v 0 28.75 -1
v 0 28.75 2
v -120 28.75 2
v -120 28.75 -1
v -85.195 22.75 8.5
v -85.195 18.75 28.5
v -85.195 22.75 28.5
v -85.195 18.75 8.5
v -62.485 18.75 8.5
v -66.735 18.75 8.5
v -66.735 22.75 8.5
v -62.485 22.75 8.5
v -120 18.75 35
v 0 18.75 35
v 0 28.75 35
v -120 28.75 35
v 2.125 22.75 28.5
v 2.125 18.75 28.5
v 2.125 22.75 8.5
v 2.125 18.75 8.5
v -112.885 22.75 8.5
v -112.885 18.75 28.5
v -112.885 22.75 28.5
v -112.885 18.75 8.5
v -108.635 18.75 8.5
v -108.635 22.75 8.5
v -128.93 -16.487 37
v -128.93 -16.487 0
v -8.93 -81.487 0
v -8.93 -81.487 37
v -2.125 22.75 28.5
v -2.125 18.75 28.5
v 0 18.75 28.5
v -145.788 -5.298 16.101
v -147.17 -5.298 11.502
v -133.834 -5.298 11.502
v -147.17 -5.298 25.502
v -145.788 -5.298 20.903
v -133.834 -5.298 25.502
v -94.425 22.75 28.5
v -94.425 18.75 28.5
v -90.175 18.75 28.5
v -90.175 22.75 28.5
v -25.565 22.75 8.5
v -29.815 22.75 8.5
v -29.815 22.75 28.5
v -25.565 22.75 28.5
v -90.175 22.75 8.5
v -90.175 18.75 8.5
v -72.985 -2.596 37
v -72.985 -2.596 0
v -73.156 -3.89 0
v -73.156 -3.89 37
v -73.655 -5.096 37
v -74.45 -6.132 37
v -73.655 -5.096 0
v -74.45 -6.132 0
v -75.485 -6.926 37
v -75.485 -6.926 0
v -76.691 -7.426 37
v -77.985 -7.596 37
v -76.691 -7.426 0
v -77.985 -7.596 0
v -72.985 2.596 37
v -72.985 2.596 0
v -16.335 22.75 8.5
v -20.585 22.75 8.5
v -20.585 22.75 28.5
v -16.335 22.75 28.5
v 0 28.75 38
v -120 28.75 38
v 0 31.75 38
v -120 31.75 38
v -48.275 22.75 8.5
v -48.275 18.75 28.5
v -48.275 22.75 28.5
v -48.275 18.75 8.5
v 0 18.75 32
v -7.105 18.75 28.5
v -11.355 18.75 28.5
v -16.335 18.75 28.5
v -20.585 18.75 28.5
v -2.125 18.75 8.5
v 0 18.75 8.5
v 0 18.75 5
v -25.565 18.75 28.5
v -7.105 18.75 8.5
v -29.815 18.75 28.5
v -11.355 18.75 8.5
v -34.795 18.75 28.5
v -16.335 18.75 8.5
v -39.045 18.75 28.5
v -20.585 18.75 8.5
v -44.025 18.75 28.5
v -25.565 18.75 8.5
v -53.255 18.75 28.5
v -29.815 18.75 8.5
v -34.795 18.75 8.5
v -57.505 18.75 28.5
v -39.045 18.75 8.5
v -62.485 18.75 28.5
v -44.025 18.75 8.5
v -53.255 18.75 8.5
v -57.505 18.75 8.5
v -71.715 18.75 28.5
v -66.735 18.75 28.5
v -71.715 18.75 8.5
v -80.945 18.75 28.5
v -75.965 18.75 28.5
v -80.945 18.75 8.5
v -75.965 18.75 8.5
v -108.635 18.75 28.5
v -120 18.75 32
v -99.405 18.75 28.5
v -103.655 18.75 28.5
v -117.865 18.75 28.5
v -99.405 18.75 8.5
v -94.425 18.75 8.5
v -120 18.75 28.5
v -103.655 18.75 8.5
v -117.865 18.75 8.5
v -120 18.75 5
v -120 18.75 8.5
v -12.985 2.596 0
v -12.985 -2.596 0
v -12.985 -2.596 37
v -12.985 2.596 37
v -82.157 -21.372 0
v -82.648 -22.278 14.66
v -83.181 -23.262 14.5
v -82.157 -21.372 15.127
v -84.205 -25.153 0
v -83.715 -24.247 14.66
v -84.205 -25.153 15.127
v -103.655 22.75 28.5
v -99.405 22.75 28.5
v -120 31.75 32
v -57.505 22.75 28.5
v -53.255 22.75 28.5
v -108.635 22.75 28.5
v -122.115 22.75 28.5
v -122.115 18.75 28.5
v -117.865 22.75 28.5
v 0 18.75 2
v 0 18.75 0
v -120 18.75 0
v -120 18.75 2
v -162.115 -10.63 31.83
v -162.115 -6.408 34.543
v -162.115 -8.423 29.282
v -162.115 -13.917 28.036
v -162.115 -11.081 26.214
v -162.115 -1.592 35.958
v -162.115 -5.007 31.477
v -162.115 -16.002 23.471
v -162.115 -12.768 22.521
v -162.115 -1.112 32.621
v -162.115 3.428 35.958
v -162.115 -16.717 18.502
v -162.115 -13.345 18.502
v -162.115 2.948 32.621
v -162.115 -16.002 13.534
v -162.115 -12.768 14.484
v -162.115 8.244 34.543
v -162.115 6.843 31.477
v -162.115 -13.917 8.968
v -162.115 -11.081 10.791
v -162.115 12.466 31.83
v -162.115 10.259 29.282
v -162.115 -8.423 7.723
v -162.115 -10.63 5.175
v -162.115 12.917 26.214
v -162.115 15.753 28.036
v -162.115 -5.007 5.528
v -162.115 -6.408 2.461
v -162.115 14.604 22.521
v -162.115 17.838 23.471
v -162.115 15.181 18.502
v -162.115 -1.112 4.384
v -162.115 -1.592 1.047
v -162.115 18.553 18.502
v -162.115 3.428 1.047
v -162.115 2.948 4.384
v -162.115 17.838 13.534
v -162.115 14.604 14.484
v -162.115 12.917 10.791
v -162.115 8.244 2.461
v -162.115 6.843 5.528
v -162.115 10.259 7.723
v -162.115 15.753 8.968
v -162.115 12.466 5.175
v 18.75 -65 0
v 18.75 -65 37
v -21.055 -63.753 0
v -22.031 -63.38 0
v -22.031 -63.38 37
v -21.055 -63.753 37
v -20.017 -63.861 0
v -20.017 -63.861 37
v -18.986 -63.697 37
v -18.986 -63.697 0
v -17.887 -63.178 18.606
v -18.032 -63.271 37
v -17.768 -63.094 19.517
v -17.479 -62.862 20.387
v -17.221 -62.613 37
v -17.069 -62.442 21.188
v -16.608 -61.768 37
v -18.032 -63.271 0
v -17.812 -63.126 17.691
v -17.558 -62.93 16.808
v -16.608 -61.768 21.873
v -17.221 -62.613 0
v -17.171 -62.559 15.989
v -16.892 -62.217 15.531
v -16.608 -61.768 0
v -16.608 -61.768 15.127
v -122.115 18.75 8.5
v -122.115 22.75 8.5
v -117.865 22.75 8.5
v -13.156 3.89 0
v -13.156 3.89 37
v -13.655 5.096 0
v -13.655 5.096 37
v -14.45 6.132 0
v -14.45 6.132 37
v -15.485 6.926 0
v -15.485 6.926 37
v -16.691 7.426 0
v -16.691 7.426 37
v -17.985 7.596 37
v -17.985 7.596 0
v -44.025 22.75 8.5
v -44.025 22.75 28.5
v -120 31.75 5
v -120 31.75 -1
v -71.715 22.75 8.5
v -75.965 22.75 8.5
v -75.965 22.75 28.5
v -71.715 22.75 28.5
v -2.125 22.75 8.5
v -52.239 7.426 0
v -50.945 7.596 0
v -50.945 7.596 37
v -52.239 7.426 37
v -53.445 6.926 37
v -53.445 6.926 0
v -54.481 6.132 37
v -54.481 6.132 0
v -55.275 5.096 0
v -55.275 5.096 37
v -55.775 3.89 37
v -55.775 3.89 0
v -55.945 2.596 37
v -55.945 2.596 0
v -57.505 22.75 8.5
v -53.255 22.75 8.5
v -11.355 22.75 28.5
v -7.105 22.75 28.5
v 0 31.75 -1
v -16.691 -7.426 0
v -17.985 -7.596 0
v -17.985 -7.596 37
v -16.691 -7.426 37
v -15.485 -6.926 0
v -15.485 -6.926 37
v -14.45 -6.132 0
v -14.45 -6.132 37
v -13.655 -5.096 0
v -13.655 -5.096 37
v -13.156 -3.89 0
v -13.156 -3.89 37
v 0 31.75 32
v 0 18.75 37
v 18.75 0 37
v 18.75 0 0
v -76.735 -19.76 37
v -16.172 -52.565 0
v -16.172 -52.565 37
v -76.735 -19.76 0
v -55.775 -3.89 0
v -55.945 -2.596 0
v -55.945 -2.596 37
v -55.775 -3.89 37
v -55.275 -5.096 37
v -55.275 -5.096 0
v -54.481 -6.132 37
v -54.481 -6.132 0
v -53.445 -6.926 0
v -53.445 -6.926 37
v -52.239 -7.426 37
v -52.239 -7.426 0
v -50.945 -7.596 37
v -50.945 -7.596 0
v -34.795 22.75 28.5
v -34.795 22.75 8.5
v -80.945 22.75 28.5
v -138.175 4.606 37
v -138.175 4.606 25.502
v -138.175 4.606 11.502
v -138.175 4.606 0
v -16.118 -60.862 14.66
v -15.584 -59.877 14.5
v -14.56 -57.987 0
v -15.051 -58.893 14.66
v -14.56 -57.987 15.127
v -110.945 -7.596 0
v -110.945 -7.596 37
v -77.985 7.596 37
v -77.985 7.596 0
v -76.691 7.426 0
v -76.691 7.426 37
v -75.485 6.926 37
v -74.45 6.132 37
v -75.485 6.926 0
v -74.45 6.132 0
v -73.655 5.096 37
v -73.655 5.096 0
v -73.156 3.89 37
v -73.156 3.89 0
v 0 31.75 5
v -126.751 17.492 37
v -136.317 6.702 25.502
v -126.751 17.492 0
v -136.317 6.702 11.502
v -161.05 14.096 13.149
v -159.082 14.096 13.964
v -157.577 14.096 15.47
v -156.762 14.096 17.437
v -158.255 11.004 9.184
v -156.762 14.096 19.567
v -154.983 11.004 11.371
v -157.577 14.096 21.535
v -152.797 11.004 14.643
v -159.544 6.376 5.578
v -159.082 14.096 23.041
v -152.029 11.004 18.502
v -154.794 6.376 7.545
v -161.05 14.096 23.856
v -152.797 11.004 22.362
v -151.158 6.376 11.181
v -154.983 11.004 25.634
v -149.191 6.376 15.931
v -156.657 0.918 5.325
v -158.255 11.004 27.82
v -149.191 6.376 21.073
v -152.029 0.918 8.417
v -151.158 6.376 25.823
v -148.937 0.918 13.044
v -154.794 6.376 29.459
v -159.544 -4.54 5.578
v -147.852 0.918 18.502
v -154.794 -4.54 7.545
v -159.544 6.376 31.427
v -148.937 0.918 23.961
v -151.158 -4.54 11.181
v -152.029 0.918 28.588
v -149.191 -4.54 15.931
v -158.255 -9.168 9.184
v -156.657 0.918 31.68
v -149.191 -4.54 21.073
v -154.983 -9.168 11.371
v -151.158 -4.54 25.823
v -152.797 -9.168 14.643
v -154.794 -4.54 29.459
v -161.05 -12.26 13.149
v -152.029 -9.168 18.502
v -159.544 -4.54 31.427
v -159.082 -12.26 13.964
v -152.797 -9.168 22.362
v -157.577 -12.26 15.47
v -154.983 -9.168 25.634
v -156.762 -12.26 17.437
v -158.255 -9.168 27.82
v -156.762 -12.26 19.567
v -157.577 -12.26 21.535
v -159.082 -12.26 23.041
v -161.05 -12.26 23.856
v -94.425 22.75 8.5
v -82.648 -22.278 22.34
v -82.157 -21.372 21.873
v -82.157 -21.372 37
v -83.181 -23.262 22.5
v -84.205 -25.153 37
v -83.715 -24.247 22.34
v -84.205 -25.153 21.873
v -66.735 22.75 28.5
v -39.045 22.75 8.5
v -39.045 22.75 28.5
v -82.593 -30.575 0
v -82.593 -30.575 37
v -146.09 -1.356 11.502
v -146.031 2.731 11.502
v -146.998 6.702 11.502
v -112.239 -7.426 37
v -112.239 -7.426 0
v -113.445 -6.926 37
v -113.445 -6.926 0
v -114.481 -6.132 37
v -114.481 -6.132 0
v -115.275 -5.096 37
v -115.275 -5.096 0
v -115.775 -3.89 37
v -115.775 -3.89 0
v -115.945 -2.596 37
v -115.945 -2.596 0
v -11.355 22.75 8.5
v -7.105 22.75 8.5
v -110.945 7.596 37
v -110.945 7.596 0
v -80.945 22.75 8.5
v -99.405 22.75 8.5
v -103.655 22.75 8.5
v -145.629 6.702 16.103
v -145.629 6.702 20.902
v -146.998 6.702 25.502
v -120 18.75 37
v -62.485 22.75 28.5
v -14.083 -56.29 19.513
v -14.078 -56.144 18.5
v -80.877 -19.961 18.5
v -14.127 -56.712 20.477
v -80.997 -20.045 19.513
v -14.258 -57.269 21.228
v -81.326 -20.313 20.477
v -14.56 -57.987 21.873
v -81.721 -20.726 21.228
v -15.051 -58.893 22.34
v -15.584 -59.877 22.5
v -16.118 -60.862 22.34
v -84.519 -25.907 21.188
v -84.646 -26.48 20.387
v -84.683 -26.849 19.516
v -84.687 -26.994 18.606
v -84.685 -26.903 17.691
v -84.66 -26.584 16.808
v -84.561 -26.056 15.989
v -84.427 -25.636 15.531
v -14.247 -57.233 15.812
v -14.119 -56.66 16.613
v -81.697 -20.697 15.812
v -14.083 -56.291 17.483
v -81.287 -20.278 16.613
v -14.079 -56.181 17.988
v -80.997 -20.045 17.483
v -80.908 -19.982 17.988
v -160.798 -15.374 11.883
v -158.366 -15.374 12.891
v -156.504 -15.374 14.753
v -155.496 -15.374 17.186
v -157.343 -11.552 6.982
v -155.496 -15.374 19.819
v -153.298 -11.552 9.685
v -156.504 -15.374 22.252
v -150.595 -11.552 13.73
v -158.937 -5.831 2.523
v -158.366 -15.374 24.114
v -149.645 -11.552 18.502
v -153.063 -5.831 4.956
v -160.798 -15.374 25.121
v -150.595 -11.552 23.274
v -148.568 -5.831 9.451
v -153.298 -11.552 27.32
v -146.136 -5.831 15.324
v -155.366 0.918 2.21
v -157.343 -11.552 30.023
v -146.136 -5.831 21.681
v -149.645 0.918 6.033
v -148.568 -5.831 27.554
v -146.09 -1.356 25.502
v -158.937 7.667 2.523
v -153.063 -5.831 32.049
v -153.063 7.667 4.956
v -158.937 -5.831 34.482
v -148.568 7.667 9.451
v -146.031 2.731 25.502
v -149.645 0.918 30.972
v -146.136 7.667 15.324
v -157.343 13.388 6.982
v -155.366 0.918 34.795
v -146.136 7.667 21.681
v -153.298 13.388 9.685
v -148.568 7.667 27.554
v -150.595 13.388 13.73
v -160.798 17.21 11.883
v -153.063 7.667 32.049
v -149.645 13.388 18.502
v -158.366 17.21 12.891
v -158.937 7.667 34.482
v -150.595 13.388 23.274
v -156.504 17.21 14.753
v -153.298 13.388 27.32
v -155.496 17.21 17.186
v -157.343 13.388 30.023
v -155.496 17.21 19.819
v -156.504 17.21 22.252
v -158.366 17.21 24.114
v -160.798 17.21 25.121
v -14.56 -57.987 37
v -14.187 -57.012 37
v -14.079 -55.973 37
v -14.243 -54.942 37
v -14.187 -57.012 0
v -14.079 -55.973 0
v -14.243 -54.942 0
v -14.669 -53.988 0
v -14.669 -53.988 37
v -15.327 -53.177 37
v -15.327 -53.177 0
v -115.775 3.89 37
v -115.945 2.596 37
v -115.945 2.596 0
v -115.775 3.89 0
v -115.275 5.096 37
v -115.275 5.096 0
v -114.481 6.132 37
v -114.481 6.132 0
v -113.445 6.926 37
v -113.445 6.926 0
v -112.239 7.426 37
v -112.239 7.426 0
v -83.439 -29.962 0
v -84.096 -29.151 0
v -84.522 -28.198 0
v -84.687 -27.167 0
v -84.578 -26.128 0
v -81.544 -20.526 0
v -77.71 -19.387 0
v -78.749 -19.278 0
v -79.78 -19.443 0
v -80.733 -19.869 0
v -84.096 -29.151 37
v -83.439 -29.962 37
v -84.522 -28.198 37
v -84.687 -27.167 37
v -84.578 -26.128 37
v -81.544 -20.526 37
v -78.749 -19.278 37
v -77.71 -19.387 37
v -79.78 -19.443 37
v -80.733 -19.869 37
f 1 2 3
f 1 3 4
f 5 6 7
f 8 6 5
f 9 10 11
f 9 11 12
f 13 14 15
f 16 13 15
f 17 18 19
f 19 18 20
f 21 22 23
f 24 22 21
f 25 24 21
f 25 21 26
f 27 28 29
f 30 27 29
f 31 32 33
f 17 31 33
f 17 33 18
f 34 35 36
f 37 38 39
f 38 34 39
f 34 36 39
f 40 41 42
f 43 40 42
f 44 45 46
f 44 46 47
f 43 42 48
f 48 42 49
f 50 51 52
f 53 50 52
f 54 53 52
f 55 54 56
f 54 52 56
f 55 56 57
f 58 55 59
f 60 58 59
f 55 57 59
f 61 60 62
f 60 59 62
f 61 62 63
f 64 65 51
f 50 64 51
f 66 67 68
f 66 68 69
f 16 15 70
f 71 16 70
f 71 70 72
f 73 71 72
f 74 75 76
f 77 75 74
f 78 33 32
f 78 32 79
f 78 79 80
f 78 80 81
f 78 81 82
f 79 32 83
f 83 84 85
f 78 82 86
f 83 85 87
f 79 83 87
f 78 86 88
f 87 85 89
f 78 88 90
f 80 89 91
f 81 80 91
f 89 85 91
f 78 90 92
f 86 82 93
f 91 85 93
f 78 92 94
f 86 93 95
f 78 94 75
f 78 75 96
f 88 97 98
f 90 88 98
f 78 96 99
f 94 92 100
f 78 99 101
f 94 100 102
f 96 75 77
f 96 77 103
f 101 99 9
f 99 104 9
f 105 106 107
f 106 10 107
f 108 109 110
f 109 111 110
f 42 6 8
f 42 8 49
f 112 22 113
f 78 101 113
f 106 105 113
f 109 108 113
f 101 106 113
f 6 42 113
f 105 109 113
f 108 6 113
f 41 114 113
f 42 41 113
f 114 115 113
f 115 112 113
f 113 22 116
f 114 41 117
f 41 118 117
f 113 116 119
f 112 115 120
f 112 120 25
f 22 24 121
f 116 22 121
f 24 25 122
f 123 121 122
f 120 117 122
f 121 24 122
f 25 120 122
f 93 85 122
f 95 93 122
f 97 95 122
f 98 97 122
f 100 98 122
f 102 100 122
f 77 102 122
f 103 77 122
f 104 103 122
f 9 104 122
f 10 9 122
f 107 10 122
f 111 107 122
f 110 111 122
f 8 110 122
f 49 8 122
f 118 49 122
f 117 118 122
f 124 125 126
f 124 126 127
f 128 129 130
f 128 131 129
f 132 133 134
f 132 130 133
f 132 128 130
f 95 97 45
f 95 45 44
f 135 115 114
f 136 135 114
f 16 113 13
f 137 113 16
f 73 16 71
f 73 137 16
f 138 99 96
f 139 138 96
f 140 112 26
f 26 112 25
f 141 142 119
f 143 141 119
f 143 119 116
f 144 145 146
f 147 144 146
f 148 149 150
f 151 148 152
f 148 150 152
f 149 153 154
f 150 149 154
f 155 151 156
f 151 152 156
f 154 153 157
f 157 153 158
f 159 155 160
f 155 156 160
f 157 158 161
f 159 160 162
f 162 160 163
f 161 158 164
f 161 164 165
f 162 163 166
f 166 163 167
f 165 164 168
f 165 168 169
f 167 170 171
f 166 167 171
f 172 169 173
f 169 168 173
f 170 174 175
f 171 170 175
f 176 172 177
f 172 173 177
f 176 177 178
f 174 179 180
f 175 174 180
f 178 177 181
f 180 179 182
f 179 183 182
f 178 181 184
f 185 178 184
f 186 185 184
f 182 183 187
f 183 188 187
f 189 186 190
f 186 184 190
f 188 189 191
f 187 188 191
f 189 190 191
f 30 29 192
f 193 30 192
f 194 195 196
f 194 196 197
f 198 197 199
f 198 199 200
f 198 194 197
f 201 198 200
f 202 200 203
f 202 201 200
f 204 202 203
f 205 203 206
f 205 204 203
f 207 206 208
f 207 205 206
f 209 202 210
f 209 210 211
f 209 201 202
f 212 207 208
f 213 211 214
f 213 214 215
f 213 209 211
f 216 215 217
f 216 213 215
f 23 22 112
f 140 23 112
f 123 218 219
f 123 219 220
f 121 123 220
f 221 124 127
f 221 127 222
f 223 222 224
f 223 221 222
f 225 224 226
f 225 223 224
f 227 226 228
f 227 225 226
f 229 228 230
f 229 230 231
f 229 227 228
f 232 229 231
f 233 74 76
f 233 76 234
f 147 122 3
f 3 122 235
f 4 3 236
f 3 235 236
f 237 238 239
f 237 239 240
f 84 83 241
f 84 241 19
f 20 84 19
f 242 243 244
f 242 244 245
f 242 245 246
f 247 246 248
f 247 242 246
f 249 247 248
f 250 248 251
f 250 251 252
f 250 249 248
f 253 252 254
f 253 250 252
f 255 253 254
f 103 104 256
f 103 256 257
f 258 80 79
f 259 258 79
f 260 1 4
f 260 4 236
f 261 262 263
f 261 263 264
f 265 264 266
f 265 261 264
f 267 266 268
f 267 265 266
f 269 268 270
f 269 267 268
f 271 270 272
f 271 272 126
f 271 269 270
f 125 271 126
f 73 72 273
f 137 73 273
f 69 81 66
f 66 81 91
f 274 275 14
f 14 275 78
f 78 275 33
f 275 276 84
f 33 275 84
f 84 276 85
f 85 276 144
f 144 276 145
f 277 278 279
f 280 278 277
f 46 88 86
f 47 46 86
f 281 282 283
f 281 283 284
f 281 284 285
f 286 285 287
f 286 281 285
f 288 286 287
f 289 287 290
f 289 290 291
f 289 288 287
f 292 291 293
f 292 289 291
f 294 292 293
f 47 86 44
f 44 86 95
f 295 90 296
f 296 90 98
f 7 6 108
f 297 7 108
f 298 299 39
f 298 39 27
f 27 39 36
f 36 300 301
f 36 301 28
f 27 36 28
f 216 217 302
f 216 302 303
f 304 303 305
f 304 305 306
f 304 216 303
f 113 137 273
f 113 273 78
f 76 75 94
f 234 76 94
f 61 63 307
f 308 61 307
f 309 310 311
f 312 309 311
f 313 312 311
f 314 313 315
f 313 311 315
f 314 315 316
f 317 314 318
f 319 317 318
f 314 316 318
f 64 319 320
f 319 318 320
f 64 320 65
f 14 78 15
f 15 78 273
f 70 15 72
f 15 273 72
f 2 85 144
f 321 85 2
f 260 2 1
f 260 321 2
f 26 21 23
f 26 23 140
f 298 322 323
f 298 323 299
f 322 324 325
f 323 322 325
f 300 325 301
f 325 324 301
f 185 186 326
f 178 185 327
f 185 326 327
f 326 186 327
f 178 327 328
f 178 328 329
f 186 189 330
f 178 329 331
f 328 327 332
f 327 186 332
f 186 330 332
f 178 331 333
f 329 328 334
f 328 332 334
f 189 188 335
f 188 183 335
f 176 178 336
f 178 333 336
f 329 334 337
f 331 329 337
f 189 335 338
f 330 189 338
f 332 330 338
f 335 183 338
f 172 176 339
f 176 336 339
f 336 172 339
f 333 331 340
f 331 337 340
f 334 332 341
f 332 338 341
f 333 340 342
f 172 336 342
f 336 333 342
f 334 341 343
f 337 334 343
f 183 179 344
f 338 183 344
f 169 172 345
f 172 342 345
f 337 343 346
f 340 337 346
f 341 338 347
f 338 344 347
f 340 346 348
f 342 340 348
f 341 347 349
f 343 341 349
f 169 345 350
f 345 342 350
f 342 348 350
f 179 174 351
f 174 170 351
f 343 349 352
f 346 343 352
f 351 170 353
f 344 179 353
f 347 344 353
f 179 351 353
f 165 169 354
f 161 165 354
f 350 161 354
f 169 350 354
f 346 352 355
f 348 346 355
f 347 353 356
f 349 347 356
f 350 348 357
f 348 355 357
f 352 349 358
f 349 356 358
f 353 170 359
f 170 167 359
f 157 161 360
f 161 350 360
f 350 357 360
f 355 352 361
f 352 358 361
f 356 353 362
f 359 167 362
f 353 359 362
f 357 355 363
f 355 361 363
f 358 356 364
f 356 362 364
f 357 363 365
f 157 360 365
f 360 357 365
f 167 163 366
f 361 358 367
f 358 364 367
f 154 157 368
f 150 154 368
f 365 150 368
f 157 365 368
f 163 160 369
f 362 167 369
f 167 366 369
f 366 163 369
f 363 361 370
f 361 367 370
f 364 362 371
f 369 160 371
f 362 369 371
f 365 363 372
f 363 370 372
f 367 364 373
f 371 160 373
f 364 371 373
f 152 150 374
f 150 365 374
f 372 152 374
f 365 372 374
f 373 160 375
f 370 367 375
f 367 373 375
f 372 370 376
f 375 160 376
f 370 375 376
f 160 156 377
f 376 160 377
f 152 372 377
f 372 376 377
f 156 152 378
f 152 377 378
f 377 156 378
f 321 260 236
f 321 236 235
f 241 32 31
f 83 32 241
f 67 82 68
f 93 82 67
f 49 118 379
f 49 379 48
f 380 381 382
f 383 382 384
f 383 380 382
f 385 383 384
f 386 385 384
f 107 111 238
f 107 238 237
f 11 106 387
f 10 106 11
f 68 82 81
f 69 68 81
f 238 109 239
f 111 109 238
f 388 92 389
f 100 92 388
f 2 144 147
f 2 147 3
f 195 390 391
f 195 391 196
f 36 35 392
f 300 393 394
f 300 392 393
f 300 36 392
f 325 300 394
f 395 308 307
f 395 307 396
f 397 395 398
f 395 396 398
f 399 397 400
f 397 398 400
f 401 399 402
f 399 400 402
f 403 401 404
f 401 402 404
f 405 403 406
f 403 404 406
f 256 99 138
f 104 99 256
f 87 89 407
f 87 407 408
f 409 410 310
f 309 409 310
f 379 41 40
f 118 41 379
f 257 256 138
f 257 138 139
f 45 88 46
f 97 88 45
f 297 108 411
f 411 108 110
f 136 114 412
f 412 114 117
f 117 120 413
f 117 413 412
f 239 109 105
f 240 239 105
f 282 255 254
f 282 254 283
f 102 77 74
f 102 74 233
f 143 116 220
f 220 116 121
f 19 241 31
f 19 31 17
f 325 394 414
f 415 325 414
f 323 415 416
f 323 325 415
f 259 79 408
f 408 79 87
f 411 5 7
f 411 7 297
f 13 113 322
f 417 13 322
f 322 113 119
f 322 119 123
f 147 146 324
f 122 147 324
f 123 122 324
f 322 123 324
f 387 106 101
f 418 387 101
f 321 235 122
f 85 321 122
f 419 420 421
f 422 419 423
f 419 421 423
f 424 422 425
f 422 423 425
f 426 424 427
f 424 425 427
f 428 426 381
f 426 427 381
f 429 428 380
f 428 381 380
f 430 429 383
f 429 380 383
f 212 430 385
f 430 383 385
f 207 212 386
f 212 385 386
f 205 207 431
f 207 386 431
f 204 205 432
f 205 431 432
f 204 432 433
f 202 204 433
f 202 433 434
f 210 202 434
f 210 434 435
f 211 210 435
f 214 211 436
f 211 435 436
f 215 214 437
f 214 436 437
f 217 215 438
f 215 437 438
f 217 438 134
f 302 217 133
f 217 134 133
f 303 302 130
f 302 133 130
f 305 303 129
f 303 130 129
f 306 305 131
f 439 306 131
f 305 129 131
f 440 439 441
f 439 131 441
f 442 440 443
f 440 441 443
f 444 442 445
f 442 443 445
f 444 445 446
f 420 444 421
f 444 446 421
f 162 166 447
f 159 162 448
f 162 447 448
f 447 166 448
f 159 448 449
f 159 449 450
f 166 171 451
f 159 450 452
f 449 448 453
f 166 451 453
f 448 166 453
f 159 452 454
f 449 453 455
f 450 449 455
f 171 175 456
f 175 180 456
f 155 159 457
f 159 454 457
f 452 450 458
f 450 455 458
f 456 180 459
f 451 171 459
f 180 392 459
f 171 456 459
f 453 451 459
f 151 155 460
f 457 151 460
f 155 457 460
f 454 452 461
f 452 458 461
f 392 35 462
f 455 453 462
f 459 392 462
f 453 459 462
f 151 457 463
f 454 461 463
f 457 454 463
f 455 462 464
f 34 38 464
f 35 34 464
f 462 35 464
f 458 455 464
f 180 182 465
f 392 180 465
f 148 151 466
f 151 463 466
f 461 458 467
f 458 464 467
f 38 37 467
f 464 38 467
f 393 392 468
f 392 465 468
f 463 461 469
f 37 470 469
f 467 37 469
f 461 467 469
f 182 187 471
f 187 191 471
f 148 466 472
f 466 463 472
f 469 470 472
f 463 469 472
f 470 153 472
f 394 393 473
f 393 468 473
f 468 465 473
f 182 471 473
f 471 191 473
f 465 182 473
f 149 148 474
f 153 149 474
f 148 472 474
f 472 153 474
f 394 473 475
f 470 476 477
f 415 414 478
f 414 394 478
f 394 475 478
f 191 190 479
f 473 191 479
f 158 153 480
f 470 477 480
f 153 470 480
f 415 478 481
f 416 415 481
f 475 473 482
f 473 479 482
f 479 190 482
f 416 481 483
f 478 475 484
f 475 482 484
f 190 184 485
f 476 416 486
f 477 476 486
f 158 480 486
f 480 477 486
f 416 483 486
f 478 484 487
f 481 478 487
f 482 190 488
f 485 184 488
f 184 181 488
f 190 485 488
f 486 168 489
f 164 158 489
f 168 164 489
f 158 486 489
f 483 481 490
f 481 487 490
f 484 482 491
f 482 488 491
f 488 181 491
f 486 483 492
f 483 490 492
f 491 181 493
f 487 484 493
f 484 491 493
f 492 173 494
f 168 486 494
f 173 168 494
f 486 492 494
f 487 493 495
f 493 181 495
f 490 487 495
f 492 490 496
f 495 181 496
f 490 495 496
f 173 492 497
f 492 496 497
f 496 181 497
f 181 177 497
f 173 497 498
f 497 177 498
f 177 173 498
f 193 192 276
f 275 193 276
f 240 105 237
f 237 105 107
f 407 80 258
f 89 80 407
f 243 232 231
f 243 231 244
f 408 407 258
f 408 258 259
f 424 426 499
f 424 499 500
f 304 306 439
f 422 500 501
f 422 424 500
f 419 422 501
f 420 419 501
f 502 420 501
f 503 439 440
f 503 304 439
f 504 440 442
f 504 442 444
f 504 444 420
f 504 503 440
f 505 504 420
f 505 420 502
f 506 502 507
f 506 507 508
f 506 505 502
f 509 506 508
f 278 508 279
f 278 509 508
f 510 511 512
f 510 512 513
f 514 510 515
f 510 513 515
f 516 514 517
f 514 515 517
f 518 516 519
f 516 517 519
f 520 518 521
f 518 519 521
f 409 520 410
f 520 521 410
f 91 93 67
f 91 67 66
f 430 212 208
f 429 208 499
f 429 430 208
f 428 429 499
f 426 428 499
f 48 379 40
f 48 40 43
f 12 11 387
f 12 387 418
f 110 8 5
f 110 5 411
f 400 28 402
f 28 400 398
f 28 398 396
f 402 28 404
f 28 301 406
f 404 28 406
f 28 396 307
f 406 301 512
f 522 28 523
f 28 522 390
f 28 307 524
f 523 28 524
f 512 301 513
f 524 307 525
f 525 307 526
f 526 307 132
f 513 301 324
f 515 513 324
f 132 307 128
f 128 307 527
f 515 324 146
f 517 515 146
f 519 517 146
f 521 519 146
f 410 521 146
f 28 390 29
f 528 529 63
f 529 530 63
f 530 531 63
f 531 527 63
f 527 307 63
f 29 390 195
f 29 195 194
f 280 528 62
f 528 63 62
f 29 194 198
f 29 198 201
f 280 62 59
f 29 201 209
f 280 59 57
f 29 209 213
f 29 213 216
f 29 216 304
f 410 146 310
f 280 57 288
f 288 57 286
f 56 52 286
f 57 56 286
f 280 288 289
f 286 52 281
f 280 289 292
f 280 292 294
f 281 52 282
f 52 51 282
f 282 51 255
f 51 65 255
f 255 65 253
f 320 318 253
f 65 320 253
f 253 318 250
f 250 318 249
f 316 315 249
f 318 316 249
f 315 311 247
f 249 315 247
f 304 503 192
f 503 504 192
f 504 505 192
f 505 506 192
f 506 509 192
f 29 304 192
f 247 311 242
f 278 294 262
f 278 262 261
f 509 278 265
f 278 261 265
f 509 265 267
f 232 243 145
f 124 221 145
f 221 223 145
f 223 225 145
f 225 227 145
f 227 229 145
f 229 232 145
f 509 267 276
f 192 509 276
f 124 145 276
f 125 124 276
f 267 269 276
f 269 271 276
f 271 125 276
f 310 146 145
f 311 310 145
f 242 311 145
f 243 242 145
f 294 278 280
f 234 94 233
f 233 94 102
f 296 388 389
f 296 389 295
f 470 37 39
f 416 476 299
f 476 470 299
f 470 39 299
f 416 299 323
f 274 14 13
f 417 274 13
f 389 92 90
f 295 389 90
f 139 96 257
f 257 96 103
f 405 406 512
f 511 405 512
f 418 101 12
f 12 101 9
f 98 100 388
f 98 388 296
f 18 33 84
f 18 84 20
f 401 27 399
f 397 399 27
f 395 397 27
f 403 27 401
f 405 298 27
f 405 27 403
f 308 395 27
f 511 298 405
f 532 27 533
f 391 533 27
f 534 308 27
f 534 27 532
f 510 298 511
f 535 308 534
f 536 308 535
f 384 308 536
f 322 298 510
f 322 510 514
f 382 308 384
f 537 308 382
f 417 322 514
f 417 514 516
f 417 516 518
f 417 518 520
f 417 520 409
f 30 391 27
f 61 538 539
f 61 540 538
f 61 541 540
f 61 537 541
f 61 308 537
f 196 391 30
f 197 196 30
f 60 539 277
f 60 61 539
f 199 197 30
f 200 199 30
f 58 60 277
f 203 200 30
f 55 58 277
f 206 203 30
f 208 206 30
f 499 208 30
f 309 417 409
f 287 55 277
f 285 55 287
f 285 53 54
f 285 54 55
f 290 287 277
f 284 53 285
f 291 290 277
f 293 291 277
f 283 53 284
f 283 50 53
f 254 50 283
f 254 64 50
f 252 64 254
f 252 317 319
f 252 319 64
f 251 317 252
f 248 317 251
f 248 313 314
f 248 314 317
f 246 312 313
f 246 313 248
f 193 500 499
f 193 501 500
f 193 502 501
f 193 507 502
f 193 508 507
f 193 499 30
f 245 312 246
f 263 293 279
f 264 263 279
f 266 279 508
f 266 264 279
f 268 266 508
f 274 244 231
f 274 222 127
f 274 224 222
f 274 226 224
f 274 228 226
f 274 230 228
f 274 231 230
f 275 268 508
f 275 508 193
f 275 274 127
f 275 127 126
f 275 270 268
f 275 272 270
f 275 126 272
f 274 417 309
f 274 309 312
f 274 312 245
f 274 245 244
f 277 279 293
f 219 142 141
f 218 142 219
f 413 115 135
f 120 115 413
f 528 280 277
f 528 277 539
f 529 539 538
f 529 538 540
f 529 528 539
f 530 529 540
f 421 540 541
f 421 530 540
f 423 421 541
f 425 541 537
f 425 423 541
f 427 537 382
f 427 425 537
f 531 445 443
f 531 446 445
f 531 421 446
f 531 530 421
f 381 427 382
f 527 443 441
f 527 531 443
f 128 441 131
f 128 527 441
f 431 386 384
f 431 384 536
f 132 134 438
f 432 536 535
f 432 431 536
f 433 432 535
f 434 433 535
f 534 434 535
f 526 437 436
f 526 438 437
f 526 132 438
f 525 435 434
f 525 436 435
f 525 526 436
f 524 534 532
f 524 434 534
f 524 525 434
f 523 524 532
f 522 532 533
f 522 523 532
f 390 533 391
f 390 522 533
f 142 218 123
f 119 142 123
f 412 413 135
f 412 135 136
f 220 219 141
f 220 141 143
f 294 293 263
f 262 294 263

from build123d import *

# Parameters (mm, degrees)
BOSS_EXTRUDE1_DEPTH     = 37
CUT_EXTRUDE1_DEPTH      = 37
CUT_EXTRUDE1_DEPTH_BACK = 1
SKETCH13_W              = 4.25
SKETCH13_H              = 20
BOSS_EXTRUDE3_DEPTH     = 4
REVOLVE4_ANGLE          = 180
BOSS_EXTRUDE5_START     = 1.719088
SKETCH24_W              = 14
SKETCH24_H              = 12
BOSS_EXTRUDE5_DEPTH     = 13.336158
BOSS_EXTRUDE6_DEPTH     = 120
CUT_EXTRUDE2_DEPTH      = 37


with BuildPart() as part:
    # Sketch8 → Boss-Extrude1 (new body)
    with BuildSketch(Plane.XY):
        Polygon((0, 18.749877704), (-119.999774223, 18.749877704), (-126.751399414, 17.492106186), (-138.175152238, 4.606192282), (-128.930068484, -16.486854671), (-8.930236022, -81.486624843), (18.749877704, -64.999999997), (18.749877704, 0), align=None)
    extrude(amount=BOSS_EXTRUDE1_DEPTH)

    # Sketch10 → Cut-Extrude1 (cut, two sides)
    with BuildSketch(Plane.XY) as cut_extrude1_sk:
        with BuildLine():
            Line((-50.945075891, -7.596026142), (-17.985230256, -7.596026142))
            ThreePointArc((-17.985230256, -7.596026142), (-14.44969635, -6.131560048), (-12.985230256, -2.596026142))
            Line((-12.985230256, -2.596026142), (-12.985230256, 2.596026142))
            ThreePointArc((-12.985230256, 2.596026142), (-14.44969635, 6.131560048), (-17.985230256, 7.596026142))
            Line((-17.985230256, 7.596026142), (-50.945075891, 7.596026142))
            ThreePointArc((-50.945075891, 7.596026142), (-54.480609797, 6.131560048), (-55.945075891, 2.596026142))
            Line((-55.945075891, 2.596026142), (-55.945075891, -2.596026142))
            ThreePointArc((-55.945075891, -2.596026142), (-54.480609797, -6.131560048), (-50.945075891, -7.596026142))
        make_face()
        with BuildLine():
            Line((-110.945075891, 7.596026142), (-77.985230256, 7.596026142))
            ThreePointArc((-77.985230256, 7.596026142), (-74.44969635, 6.131560048), (-72.985230256, 2.596026142))
            Line((-72.985230256, 2.596026142), (-72.985230256, -2.596026142))
            ThreePointArc((-72.985230256, -2.596026142), (-74.44969635, -6.131560048), (-77.985230256, -7.596026142))
            Line((-77.985230256, -7.596026142), (-110.945075891, -7.596026142))
            ThreePointArc((-110.945075891, -7.596026142), (-114.480609797, -6.131560048), (-115.945075891, -2.596026142))
            Line((-115.945075891, -2.596026142), (-115.945075891, 2.596026142))
            ThreePointArc((-115.945075891, 2.596026142), (-114.480609797, 6.131560048), (-110.945075891, 7.596026142))
        make_face()
    extrude(amount=CUT_EXTRUDE1_DEPTH, mode=Mode.SUBTRACT)
    extrude(cut_extrude1_sk.sketch, amount=-CUT_EXTRUDE1_DEPTH_BACK, mode=Mode.SUBTRACT)

    # Sketch13 → Boss-Extrude3 (add)
    with BuildSketch(Plane(origin=(0, 18.749877704, 0), x_dir=(1, 0, 0), z_dir=(0, 1, 0))):
        with Locations((0, -18.5)):
            Rectangle(SKETCH13_W, SKETCH13_H)
        with Locations((-9.23, -18.5)):
            Rectangle(SKETCH13_W, SKETCH13_H)
        with Locations((-18.46, -18.5)):
            Rectangle(SKETCH13_W, SKETCH13_H)
        with Locations((-27.69, -18.5)):
            Rectangle(SKETCH13_W, SKETCH13_H)
        with Locations((-36.92, -18.5)):
            Rectangle(SKETCH13_W, SKETCH13_H)
        with Locations((-46.15, -18.5)):
            Rectangle(SKETCH13_W, SKETCH13_H)
        with Locations((-55.38, -18.5)):
            Rectangle(SKETCH13_W, SKETCH13_H)
        with Locations((-64.61, -18.5)):
            Rectangle(SKETCH13_W, SKETCH13_H)
        with Locations((-73.84, -18.5)):
            Rectangle(SKETCH13_W, SKETCH13_H)
        with Locations((-83.07, -18.5)):
            Rectangle(SKETCH13_W, SKETCH13_H)
        with Locations((-92.3, -18.5)):
            Rectangle(SKETCH13_W, SKETCH13_H)
        with Locations((-101.53, -18.5)):
            Rectangle(SKETCH13_W, SKETCH13_H)
        with Locations((-110.76, -18.5)):
            Rectangle(SKETCH13_W, SKETCH13_H)
        with Locations((-119.99, -18.5)):
            Rectangle(SKETCH13_W, SKETCH13_H)
    extrude(amount=BOSS_EXTRUDE3_DEPTH)



with BuildPart() as body_2:
    # Sketch23 → Revolve4 (revolve)
    with BuildSketch(Plane.ZY.offset(162.115)):
        with BuildLine():
            Line((18.502309671, 18.552772626), (18.502309671, 15.181416266))
            ThreePointArc((18.502309671, 15.181416266), (4.238878914, 0.917985509), (18.502309671, -13.345445248))
            Line((18.502309671, -13.345445248), (18.502309671, -16.716801609))
            ThreePointArc((18.502309671, -16.716801609), (0.867522554, 0.917985509), (18.502309671, 18.552772626))
        make_face()
    revolve(axis=Axis((-162.115, 19.719780597, 18.502309671), (0, -1, 0)), revolution_arc=REVOLVE4_ANGLE)


with BuildPart() as part_1:
    add(part.part)

    add(body_2.part)  # Boss-Extrude5 merges body 2
    # Sketch24 → Boss-Extrude5 (add)
    with BuildSketch(Plane.ZY.offset(132.115).offset(BOSS_EXTRUDE5_START)):
        with Locations((18.502309671, 0.701872922)):
            Rectangle(SKETCH24_W, SKETCH24_H)
    extrude(amount=BOSS_EXTRUDE5_DEPTH)

    # Sketch25 → Boss-Extrude6 (add)
    with BuildSketch(Plane(origin=(0, 0, 0), x_dir=(0, 0, -1), z_dir=(1, 0, 0))):
        Polygon((-32, 31.749877704), (-32, 18.749877704), (-35, 18.749877704), (-35, 28.749877704), (-38, 28.749877704), (-38, 31.749877704), align=None)
        Polygon((1, 31.749877704), (-5, 31.749877704), (-5, 18.749877704), (-2, 18.749877704), (-2, 28.749877704), (1, 28.749877704), align=None)
    extrude(amount=-BOSS_EXTRUDE6_DEPTH)

    # Sketch26 → Cut-Extrude2 (cut)
    with BuildSketch(Plane.XY):
        with BuildLine():
            Line((-82.157166646, -21.371866468), (-84.205180797, -25.15282376))
            ThreePointArc((-84.205180797, -25.15282376), (-84.522155627, -28.19783771), (-82.593140666, -30.575122775))
            Line((-82.593140666, -30.575122775), (-22.030526844, -63.379801738))
            ThreePointArc((-22.030526844, -63.379801738), (-18.985512893, -63.696776568), (-16.608227828, -61.767761607))
            Line((-16.608227828, -61.767761607), (-14.560213677, -57.986804316))
            ThreePointArc((-14.560213677, -57.986804316), (-14.243238847, -54.941790365), (-16.172253808, -52.5645053))
            Line((-16.172253808, -52.5645053), (-76.73486763, -19.759826338))
            ThreePointArc((-76.73486763, -19.759826338), (-79.779881581, -19.442851507), (-82.157166646, -21.371866468))
        make_face()
    extrude(amount=CUT_EXTRUDE2_DEPTH, mode=Mode.SUBTRACT)

    # Sketch27 → Revolve-Thin1 (revolve)
    with BuildSketch(Plane.XY.offset(18.5)):
        Polygon((-83.181173721, -23.262345114), (-15.584220753, -59.877282961), (-13.67909131, -56.360113388), (-81.276044279, -19.745175541), align=None)
    revolve(axis=Axis((-83.181173721, -23.262345114, 18.5), (0.879292393, -0.476282361, 0)))


solid = part_1.part
